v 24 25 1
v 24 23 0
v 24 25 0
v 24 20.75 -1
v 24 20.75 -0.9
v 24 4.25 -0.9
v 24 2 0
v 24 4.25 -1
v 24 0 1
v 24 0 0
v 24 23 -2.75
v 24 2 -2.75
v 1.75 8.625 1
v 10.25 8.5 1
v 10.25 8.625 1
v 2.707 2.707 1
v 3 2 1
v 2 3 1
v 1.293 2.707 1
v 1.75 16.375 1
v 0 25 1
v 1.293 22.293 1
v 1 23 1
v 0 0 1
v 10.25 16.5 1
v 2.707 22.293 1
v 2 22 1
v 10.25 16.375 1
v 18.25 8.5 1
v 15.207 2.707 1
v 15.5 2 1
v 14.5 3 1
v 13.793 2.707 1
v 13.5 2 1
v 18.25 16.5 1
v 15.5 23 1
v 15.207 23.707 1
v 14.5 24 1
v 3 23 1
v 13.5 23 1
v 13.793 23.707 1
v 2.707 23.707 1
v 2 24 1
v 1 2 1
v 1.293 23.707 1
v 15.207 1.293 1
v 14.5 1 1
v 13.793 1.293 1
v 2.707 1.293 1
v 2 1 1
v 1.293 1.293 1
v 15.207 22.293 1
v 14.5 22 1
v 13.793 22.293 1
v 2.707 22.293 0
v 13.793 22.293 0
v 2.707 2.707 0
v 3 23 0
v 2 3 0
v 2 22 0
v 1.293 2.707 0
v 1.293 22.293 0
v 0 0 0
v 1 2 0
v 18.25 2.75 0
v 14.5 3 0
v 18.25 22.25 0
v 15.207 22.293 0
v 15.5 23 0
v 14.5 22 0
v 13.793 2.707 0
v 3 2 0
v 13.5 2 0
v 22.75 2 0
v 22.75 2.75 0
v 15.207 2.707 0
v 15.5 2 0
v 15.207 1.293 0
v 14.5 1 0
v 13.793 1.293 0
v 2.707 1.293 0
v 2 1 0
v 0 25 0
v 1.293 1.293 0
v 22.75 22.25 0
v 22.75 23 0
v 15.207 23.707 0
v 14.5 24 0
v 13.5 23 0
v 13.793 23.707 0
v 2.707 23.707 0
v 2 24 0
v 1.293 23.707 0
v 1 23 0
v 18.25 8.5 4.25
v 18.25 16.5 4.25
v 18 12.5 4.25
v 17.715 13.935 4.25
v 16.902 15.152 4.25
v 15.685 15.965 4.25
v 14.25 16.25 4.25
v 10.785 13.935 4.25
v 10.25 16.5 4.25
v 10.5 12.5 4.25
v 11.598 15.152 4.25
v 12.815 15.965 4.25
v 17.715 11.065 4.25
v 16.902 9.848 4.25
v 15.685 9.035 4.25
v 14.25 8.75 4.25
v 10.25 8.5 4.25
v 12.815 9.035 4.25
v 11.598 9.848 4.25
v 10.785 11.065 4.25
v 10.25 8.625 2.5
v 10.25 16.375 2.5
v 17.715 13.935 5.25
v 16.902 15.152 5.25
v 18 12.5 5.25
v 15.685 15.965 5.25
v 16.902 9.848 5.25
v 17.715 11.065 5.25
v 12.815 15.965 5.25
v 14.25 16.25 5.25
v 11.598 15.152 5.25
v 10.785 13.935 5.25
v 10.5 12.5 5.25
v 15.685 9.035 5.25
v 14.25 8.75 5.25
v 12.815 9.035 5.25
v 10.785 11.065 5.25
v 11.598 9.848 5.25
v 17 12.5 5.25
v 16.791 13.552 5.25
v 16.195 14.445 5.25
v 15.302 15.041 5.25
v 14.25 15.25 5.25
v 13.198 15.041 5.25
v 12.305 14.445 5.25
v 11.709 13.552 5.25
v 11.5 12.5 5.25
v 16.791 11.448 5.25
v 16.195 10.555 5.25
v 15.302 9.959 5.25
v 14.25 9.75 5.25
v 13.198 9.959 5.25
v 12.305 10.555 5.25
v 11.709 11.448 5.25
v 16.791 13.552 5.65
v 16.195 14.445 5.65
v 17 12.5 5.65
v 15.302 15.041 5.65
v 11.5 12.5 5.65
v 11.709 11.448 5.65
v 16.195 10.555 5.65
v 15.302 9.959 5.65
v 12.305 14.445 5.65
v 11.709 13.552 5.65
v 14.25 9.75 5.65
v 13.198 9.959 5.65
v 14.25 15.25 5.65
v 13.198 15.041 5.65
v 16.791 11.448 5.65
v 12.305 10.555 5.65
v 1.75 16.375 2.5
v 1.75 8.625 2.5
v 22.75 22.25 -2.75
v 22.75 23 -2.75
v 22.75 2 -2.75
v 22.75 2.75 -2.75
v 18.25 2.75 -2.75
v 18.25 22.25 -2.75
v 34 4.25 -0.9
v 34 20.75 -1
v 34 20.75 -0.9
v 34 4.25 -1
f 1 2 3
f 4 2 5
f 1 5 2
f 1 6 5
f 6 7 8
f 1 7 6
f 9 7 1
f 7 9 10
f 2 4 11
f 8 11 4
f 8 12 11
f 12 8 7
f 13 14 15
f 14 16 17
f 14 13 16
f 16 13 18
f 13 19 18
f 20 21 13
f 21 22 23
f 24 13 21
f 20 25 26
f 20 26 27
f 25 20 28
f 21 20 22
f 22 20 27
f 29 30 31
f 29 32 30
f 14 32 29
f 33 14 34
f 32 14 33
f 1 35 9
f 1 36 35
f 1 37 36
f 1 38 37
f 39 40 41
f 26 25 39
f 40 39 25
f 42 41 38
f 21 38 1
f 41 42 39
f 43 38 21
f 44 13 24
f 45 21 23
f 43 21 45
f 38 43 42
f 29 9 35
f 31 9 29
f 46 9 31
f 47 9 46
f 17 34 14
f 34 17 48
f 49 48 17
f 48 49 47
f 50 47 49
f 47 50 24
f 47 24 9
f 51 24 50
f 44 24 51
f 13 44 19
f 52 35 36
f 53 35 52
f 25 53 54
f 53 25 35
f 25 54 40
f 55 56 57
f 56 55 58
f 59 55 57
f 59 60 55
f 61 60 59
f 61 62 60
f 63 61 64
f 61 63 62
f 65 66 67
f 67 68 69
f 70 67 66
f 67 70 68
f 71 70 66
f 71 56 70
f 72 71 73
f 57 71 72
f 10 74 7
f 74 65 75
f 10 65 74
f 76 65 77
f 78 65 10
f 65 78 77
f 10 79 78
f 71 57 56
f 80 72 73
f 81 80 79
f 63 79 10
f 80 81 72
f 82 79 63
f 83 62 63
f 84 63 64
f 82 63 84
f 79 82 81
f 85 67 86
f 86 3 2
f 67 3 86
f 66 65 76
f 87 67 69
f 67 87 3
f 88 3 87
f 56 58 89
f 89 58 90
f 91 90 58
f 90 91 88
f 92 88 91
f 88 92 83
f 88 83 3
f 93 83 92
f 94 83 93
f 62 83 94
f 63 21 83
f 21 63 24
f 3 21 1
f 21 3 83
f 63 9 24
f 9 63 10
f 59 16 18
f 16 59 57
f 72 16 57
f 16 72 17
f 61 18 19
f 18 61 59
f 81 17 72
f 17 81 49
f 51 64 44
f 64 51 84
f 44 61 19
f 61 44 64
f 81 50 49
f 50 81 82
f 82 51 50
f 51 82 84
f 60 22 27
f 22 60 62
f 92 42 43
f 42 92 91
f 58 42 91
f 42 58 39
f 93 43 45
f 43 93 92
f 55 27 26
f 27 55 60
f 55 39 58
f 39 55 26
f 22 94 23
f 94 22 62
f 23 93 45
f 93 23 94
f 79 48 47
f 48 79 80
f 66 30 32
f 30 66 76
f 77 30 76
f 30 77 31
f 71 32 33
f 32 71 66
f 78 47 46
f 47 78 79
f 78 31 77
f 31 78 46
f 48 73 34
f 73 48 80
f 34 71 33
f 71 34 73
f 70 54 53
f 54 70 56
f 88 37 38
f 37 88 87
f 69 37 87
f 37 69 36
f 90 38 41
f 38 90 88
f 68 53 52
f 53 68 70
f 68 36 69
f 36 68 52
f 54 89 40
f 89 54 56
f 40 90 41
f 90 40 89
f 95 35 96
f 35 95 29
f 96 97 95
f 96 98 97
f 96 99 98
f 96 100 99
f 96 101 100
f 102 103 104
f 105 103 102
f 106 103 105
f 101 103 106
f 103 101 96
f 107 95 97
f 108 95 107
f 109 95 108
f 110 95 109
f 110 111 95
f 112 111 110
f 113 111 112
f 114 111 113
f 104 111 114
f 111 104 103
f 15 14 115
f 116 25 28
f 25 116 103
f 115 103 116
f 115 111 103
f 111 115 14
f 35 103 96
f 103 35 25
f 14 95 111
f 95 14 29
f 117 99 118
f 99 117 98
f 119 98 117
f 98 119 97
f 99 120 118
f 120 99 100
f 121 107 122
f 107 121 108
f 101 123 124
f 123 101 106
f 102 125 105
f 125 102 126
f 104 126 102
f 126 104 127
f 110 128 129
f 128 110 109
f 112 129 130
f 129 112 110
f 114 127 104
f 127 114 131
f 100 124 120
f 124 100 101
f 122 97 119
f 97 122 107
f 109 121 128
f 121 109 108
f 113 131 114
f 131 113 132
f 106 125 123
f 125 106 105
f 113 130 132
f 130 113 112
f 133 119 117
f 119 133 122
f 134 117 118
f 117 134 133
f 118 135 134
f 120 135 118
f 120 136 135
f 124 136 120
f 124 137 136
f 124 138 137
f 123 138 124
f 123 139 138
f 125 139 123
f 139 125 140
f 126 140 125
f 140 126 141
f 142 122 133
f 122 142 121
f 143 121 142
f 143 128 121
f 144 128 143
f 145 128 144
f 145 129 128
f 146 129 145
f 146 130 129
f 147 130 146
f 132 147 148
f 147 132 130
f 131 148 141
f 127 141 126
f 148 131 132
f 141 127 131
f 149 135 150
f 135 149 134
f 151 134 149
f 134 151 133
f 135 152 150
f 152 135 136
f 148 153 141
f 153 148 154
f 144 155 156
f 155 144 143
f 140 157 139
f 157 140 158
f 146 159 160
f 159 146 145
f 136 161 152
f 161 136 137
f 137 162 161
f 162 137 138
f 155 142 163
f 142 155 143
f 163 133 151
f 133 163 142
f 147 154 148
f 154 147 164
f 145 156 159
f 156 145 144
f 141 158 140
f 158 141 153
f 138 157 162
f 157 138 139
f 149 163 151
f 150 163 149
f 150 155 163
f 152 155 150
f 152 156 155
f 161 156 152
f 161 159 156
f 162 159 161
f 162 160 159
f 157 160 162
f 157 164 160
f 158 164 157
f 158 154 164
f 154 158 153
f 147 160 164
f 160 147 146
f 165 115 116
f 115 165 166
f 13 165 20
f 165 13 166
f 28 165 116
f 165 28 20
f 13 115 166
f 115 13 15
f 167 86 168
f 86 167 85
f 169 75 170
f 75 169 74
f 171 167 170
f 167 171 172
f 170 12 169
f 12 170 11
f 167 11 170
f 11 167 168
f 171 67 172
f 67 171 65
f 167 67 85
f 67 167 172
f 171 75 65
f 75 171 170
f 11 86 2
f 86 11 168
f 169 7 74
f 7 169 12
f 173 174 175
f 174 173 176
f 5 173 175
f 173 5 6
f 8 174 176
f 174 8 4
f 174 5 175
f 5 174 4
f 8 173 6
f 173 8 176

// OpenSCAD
// Raspberry Pi Camera - OpenSCAD
//
// License: CC BY-SA 2.0
// https://creativecommons.org/licenses/by-sa/2.0/legalcode
//
// This case was designed for the Rasperry Pi 1 Model B, because that
// the one i had lying around for this project. I power it via the pin
// header 5V pin using a DC-DC buck converter and an external 9V DC
// power supply. The camera ribbon cable is slighly skewed inside the
// case, because I wanted the case to be small and it doesn't line up
// well.

module rpi_camera() {
     color("darkblue")
	  difference() {
	  cube([24,25,1]);
	  translate([2,2,-1]) cylinder(d=2,h=3,$fn=8);
	  translate([2,23,-1]) cylinder(d=2,h=3,$fn=8);
	  translate([14.5,2,-1]) cylinder(d=2,h=3,$fn=8);
	  translate([14.5,23,-1]) cylinder(d=2,h=3,$fn=8);
     }
     color("DimGray") union() {
	  translate([10.25,8.5,1]) cube([8,8,3.25]);
	  translate([10.25+4,12.5,1+3.25]) cylinder(d=7.5,h=1,$fn=16);
	  translate([10.25+4,12.5,1+3.25+0.7]) cylinder(d=5.5,h=0.7,$fn=16);
     }
     color("orange") translate([1.75,8.625,1]) cube([8.5,7.75,1.5]);
     color("brown") translate([24-5.75,2.75,-2.75]) cube([4.5,19.5,2.75]);
     color("black") translate([22.75,2,-2.75]) cube([1.25,21,2.75]);
     color("grey") translate([24,4.25,-1]) cube([10,16.5,0.1]);
}
rpi_camera();
